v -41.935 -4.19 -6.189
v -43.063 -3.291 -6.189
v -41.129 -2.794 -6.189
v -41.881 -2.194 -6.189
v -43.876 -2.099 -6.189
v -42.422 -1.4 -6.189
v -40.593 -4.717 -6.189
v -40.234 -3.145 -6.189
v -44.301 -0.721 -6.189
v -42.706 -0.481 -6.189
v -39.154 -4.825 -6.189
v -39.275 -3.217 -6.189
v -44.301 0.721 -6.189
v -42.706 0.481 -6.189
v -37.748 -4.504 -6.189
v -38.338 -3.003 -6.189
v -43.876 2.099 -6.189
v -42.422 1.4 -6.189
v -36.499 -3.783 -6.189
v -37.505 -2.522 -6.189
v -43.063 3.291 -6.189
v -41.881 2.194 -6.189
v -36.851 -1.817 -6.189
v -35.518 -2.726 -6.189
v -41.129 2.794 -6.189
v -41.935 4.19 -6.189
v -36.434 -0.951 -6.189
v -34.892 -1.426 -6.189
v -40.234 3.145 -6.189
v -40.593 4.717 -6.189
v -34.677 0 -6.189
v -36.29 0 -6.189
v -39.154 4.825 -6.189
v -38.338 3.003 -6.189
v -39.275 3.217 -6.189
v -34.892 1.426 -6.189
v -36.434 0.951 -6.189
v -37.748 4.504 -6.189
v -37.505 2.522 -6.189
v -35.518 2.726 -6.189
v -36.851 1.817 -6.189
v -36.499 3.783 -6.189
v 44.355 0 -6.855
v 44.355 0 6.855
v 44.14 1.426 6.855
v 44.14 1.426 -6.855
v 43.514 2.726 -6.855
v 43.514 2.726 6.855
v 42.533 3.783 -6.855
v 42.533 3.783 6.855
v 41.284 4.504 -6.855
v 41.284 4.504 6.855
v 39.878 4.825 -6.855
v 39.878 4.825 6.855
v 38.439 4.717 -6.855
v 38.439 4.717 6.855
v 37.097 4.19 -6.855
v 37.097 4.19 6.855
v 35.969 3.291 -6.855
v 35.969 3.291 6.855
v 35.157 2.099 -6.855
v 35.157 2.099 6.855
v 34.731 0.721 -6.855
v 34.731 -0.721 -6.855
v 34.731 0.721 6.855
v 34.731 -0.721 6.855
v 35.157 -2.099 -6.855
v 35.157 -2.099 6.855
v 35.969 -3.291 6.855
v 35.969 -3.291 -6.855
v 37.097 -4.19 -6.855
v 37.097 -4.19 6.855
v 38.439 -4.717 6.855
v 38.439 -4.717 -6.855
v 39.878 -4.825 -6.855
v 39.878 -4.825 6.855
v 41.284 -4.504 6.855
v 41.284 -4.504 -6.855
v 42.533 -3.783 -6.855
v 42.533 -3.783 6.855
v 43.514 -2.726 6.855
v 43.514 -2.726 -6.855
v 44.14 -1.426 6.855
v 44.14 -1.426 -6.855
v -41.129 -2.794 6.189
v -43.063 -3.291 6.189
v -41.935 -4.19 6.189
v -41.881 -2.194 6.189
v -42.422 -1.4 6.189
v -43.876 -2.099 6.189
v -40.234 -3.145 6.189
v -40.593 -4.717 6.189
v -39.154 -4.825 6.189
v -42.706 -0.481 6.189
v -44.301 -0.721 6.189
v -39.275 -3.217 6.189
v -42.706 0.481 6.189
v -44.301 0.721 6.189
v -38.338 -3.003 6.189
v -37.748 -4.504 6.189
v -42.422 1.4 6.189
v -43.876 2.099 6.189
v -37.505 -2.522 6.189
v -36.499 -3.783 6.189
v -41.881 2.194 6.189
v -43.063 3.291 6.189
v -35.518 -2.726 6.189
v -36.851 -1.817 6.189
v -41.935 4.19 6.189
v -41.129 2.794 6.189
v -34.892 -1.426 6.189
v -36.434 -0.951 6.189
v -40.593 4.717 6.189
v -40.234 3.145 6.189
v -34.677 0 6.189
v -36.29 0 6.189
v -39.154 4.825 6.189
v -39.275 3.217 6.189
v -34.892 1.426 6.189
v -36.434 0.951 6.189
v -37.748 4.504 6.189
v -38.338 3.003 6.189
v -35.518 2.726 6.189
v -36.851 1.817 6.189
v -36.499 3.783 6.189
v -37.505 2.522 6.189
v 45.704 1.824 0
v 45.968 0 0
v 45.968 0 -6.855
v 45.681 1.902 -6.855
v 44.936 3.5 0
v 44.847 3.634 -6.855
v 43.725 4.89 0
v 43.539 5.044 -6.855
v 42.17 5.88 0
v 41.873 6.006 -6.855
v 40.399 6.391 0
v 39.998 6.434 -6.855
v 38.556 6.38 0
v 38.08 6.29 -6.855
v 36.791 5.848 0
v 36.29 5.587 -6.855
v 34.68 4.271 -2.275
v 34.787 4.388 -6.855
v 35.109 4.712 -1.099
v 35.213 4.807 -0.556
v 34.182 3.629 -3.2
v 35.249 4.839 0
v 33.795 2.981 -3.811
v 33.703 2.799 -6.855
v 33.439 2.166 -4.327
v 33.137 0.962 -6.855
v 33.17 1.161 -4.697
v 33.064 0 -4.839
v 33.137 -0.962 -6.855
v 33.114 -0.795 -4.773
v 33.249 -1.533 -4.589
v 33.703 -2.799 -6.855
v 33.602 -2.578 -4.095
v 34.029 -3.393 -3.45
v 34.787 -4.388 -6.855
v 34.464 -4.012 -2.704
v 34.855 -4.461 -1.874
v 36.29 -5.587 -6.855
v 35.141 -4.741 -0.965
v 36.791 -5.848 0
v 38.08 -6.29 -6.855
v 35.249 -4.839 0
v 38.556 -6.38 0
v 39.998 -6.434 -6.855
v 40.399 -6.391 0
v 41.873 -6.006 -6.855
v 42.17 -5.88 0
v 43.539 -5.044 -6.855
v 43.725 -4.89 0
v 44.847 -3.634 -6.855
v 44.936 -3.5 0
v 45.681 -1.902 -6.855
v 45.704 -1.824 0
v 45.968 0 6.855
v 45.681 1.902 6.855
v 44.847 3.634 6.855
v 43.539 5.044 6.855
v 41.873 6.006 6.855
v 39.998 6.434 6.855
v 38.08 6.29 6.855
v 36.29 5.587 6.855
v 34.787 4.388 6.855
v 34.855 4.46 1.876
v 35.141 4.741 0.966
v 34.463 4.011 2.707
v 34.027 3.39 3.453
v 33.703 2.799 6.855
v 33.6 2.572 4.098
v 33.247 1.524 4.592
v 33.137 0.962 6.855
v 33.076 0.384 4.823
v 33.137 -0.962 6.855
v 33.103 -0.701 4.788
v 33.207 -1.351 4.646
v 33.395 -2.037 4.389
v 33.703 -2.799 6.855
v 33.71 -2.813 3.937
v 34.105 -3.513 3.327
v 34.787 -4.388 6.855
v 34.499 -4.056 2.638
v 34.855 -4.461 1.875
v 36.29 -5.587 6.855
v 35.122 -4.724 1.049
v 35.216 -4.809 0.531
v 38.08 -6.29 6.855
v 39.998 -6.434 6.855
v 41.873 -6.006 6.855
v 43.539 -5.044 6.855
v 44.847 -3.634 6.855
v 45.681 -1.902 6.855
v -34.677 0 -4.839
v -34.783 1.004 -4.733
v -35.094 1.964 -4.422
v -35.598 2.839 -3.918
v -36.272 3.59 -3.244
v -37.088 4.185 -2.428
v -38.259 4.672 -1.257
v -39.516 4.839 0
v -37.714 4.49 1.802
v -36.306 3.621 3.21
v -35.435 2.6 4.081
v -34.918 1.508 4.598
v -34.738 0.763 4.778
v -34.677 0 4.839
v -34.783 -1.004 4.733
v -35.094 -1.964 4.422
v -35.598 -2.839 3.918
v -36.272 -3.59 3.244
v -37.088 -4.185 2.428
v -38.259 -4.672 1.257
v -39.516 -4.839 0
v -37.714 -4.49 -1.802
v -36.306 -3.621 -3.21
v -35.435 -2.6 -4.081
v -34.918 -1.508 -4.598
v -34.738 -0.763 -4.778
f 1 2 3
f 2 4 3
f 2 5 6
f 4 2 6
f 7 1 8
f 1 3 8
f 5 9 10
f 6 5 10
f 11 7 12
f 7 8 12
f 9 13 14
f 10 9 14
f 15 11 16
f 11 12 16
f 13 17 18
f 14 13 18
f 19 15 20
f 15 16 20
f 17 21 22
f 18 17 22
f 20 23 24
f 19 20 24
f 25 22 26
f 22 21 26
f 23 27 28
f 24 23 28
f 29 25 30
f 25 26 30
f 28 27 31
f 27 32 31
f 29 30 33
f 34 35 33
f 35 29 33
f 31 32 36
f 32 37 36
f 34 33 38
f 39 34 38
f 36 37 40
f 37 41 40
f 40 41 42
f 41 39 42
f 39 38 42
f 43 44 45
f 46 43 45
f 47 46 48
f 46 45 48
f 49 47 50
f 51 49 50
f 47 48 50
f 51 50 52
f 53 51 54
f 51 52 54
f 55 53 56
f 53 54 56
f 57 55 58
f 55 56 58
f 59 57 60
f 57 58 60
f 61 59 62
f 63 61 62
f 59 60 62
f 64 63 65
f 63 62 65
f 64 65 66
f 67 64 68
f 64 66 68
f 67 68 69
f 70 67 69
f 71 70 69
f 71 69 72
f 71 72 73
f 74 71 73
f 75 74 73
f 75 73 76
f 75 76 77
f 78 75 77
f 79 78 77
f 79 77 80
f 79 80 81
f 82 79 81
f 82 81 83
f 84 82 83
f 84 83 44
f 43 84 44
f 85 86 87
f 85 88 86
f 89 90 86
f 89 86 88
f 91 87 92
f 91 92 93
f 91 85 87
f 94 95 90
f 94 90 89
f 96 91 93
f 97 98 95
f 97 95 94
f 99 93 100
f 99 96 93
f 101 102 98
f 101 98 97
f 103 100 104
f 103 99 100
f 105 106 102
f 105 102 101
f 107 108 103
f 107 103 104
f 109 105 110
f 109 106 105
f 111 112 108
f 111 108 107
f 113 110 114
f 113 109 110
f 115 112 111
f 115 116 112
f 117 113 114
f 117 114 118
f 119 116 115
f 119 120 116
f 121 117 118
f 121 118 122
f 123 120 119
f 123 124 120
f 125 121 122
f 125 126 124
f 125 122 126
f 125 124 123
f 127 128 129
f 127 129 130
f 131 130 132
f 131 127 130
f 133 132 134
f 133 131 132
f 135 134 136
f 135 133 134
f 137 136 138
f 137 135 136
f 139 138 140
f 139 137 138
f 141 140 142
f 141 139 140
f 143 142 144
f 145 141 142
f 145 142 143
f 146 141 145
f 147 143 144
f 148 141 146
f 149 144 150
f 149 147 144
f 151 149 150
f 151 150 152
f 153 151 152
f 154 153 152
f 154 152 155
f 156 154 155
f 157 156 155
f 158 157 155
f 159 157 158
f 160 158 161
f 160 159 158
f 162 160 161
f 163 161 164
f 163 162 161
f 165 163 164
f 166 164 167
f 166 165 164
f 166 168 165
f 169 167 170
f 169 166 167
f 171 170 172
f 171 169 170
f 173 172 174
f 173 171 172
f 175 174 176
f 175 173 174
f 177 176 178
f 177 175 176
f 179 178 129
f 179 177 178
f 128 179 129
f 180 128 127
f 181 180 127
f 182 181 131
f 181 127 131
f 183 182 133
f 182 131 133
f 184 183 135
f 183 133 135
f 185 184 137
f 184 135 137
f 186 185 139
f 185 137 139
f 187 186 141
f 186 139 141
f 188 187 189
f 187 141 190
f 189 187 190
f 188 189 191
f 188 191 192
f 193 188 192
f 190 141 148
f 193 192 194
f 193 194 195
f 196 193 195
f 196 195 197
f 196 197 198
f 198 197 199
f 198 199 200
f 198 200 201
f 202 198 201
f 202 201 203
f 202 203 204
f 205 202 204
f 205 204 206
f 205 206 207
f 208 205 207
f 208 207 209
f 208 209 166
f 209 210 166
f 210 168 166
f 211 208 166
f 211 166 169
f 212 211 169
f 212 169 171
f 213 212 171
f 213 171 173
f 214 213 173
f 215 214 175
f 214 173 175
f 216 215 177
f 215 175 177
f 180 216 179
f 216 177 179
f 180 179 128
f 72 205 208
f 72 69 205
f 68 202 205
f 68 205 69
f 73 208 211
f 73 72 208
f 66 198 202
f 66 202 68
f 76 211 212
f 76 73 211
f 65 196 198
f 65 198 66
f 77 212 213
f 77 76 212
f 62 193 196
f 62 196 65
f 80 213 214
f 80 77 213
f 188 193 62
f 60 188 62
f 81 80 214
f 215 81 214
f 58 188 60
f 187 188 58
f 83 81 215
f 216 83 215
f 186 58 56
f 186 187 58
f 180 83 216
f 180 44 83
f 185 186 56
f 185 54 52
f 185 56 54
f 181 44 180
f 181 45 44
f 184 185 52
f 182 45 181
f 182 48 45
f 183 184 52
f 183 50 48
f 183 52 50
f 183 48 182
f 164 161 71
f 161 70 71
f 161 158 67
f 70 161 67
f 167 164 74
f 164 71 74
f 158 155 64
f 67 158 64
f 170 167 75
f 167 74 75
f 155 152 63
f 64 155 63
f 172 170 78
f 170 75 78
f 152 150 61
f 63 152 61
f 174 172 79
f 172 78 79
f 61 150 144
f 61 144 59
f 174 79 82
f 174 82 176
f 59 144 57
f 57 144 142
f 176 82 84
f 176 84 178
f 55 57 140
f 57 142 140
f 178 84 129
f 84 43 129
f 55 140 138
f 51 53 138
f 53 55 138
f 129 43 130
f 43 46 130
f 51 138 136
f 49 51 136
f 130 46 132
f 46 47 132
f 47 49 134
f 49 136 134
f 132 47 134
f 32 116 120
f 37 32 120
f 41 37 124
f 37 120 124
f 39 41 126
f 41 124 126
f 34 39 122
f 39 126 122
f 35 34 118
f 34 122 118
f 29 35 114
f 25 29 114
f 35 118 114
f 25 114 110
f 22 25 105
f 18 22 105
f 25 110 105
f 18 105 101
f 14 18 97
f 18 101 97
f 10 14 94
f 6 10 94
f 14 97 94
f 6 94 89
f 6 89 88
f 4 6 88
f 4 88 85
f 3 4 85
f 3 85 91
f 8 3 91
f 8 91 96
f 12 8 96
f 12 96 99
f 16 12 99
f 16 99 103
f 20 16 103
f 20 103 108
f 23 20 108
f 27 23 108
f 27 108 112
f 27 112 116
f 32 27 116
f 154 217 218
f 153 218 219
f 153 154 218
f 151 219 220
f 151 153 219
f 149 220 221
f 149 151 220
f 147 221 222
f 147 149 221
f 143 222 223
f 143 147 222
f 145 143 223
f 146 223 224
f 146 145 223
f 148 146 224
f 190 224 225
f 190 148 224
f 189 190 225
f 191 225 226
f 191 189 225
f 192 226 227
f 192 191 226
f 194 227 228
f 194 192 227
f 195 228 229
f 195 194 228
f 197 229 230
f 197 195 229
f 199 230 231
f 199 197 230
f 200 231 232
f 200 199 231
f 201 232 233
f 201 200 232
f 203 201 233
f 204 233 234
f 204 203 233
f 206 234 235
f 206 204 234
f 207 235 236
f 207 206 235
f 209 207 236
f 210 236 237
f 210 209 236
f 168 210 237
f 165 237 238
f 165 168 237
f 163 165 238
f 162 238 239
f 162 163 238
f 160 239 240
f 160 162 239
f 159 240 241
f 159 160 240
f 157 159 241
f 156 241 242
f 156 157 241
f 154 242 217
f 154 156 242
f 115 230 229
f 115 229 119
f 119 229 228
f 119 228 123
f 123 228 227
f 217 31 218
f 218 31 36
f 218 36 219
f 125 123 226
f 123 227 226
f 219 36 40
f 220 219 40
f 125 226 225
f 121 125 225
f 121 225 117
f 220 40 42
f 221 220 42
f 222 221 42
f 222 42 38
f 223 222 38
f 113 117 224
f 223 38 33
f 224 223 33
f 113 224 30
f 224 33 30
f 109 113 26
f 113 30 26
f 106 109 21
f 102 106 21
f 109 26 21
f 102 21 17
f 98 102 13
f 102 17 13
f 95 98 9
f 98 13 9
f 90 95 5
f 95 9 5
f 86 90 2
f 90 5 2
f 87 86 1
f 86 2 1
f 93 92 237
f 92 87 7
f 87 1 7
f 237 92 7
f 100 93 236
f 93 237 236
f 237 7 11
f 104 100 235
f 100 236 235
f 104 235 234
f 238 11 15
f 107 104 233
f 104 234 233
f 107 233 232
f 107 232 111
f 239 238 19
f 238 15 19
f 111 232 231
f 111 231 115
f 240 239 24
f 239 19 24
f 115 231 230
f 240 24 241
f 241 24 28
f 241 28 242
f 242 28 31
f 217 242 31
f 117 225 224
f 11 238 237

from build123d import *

# Parameters (mm, degrees)
BOSS_EXTRUDE1_DEPTH      = 39.51605
BOSS_EXTRUDE1_DEPTH_BACK = 39.51605
SKETCH1_R                = 4.8387
BOSS_EXTRUDE2_DEPTH      = 6.18871
BOSS_EXTRUDE2_DEPTH_BACK = 6.18871
SKETCH2_R                = 4.8387
SKETCH3_R                = 3.2258
CUT_EXTRUDE1_DEPTH       = 47.302887503
BOSS_EXTRUDE3_DEPTH      = 6.85546
BOSS_EXTRUDE3_DEPTH_BACK = 6.85546
SKETCH4_R                = 6.4516
SKETCH5_R                = 4.8387
CUT_EXTRUDE2_DEPTH       = 49.400798852


with BuildPart() as part:
    # Sketch1 → Boss-Extrude1 (new, two sides: drawn at the far end of the back side and taken through both)
    with BuildSketch(Plane(origin=(0, 0, 0), x_dir=(0, 0, -1), z_dir=(1, 0, 0)).offset(-BOSS_EXTRUDE1_DEPTH_BACK)):
        Circle(SKETCH1_R)
    extrude(amount=BOSS_EXTRUDE1_DEPTH + BOSS_EXTRUDE1_DEPTH_BACK)

    # Sketch2 → Boss-Extrude2 (add, two sides: drawn at the far end of the back side and taken through both)
    with BuildSketch(Plane.XY.offset(-BOSS_EXTRUDE2_DEPTH_BACK)):
        with Locations((-39.51605, 0)):
            Circle(SKETCH2_R)
    extrude(amount=BOSS_EXTRUDE2_DEPTH + BOSS_EXTRUDE2_DEPTH_BACK)

    # Sketch3 → Cut-Extrude1 (cut, through all)
    with BuildSketch(Plane.XY.offset(6.18871)):
        with Locations((-39.51605, 0)):
            Circle(SKETCH3_R)
    extrude(amount=-CUT_EXTRUDE1_DEPTH, mode=Mode.SUBTRACT)

    # Sketch4 → Boss-Extrude3 (add, two sides: drawn at the far end of the back side and taken through both)
    with BuildSketch(Plane.XY.offset(-BOSS_EXTRUDE3_DEPTH_BACK)):
        with Locations((39.51605, 0)):
            Circle(SKETCH4_R)
    extrude(amount=BOSS_EXTRUDE3_DEPTH + BOSS_EXTRUDE3_DEPTH_BACK)

    # Sketch5 → Cut-Extrude2 (cut, through all)
    with BuildSketch(Plane.XY.offset(6.85546)):
        with Locations((39.51605, 0)):
            Circle(SKETCH5_R)
    extrude(amount=-CUT_EXTRUDE2_DEPTH, mode=Mode.SUBTRACT)


solid = part.part
